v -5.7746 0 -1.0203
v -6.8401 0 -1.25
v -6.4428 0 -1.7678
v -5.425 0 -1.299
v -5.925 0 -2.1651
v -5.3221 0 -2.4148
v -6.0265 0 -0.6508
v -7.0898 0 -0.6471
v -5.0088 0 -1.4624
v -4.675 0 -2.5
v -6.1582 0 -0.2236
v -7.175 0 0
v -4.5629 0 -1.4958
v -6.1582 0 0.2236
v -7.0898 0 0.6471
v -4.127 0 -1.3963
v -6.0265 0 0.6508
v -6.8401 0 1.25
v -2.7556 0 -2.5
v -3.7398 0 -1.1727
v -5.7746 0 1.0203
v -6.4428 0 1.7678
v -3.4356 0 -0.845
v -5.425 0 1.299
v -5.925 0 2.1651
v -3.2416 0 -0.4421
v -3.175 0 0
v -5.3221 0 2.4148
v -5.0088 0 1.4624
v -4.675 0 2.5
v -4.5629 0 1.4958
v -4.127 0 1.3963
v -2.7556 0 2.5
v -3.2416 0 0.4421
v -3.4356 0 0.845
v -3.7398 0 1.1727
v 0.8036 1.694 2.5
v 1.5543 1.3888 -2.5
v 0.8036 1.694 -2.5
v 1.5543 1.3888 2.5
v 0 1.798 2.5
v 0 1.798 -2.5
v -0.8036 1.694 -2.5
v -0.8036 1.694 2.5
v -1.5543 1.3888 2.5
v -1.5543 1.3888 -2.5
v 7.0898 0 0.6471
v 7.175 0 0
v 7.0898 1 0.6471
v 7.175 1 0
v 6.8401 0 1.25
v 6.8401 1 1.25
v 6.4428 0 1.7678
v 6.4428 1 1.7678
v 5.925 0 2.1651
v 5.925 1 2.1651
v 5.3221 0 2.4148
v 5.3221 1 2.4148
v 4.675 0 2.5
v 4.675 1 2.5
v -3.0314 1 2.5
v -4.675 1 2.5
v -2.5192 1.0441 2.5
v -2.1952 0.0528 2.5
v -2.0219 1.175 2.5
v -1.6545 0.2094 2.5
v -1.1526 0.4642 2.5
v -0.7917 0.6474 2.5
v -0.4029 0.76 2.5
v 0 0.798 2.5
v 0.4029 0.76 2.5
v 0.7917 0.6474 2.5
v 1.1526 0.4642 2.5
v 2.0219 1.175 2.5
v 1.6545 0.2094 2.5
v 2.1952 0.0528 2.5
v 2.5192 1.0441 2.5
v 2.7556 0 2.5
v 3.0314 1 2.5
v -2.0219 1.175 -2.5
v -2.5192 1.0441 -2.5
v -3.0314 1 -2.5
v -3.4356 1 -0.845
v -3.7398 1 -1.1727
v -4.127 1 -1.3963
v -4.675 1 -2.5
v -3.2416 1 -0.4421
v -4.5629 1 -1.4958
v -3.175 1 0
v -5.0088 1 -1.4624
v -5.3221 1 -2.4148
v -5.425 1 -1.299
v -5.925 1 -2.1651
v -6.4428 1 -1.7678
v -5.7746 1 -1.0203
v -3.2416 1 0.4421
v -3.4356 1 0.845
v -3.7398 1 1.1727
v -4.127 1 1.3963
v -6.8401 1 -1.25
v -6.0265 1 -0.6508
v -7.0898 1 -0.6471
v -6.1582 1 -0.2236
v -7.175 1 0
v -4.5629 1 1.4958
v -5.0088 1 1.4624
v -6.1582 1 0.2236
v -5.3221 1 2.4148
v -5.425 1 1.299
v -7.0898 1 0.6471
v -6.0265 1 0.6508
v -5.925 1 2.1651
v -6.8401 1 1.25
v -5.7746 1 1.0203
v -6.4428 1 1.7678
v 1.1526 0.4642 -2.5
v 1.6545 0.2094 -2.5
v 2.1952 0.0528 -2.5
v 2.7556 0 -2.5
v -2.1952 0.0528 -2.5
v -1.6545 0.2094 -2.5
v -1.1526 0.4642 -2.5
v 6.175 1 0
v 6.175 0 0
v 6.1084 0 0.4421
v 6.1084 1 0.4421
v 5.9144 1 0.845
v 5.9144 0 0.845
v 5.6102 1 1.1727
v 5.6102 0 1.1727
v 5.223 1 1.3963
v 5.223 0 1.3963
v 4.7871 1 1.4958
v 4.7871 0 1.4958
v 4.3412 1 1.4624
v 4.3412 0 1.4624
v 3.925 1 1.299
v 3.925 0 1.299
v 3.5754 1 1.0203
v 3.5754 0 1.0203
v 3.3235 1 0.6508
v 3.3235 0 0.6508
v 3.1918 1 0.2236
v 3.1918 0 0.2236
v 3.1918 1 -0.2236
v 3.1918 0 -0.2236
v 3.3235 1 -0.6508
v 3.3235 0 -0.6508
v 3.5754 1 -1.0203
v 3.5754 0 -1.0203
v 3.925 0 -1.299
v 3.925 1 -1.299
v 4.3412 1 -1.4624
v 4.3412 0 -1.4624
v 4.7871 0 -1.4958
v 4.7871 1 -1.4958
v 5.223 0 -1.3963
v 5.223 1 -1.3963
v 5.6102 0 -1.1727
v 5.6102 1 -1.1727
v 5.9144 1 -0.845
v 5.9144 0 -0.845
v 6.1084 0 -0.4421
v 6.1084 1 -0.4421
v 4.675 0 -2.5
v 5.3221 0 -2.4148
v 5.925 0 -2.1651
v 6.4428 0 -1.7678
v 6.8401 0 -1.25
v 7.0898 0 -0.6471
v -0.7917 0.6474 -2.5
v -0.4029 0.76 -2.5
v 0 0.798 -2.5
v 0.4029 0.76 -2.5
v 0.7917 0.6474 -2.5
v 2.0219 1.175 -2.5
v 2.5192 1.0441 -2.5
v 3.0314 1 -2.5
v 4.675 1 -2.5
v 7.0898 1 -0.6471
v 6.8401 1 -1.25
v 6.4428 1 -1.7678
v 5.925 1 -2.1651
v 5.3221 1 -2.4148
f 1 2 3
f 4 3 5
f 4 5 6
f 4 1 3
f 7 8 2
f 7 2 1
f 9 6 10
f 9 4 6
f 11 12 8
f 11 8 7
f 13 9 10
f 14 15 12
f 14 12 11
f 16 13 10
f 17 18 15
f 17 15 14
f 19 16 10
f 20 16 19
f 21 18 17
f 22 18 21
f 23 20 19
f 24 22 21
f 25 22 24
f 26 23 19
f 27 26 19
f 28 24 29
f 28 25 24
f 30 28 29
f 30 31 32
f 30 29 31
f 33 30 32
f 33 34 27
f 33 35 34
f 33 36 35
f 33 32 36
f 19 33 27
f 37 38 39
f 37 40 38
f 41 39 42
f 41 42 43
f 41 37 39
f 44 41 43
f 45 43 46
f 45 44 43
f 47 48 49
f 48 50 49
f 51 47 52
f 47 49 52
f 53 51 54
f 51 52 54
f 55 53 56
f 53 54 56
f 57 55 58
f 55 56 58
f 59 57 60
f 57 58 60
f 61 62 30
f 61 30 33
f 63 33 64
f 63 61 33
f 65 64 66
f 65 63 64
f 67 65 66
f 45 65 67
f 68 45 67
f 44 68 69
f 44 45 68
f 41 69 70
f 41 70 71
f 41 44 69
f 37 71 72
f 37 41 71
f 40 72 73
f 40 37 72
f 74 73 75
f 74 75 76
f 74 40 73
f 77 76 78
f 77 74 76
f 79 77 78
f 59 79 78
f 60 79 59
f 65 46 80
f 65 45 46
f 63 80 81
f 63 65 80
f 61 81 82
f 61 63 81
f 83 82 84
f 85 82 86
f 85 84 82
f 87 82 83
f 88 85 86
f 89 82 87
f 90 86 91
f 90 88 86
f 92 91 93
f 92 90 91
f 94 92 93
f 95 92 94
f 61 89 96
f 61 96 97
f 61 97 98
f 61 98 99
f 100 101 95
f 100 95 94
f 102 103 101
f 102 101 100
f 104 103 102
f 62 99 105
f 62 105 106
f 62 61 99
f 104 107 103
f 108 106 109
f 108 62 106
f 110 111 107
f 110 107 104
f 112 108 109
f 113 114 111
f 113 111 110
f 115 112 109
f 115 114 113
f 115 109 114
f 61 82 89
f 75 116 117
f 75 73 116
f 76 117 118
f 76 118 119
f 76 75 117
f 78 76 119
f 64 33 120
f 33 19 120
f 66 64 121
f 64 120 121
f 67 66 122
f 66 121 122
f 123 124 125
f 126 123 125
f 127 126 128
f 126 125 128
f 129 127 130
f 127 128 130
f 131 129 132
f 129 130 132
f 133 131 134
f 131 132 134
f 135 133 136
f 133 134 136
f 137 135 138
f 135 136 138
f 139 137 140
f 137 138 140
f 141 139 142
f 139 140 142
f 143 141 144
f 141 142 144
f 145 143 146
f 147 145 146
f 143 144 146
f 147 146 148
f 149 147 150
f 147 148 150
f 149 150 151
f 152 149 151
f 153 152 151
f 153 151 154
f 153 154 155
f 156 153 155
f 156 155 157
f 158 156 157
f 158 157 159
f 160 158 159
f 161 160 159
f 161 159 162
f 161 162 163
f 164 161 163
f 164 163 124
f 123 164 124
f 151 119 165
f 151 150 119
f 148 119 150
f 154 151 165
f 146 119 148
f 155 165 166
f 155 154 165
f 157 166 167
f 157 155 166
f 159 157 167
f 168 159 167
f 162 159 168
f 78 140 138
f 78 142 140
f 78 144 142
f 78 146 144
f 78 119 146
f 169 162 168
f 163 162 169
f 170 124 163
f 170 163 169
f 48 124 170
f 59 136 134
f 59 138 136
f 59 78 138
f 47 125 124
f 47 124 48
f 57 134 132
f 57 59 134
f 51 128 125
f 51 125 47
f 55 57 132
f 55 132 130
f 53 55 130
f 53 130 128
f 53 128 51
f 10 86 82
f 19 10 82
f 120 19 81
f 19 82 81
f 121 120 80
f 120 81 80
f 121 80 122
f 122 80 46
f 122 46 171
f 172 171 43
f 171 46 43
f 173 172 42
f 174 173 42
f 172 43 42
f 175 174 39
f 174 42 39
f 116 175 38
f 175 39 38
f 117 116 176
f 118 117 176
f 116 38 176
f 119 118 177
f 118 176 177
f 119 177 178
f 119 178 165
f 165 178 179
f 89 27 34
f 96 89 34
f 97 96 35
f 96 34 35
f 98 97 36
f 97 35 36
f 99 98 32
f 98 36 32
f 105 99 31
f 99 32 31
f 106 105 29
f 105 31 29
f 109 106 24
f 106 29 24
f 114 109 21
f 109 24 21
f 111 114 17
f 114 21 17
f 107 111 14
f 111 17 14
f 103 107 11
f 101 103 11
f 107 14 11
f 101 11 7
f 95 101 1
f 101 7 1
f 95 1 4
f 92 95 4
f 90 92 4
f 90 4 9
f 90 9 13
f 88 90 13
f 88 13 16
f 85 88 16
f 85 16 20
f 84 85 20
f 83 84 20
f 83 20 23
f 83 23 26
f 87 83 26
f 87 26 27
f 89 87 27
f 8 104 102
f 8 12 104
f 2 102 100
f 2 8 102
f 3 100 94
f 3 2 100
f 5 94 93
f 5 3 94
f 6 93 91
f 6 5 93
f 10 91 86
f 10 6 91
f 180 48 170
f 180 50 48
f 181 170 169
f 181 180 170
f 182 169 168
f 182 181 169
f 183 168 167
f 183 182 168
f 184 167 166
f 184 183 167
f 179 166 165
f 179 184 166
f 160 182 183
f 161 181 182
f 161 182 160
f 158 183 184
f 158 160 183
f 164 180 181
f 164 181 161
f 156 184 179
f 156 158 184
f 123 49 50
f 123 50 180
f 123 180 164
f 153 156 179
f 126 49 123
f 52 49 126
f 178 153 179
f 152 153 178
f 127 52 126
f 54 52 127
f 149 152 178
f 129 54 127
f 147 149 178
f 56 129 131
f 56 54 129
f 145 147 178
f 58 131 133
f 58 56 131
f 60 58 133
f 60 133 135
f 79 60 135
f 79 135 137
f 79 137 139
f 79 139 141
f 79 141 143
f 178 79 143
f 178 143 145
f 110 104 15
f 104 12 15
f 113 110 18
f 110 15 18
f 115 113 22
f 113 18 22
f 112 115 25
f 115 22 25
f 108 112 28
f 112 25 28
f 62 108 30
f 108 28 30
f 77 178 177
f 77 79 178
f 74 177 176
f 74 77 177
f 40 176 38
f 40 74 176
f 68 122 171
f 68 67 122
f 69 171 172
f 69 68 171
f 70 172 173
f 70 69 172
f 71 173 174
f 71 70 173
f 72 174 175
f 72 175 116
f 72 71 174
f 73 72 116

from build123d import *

# Parameters (mm, degrees)
F1_DEPTH      = 2.5
F1_DEPTH_BACK = 2.5
F2_R          = 2.49999
F3_R          = 1.5
F4_DEPTH      = 25
F5_R          = 3


# Not quite as in the source:
# - a fillet or chamfer is up to 0.001 mm smaller than in the source, because OpenCascade refuses the exact size


with BuildPart() as f1:
    # F0 (on Top) → F1 (new body, two sides)
    with BuildSketch(Plane.XY) as f1_sk:
        with BuildLine():
            Line((-6.175, 0), (-4.675, 0))
            Line((-4.675, 0), (-3.175, 0))
            Line((-3.175, 0), (-1.675, 0))
            ThreePointArc((-1.675, 0), (-0.9276877762, 0.5883021777), (0, 0.7979933839))
            Line((0, 0.7979933839), (0, 1))
            Line((0, 1), (-2.0980018512, 1))
            Line((-2.0980018512, 1), (-7.175, 1))
            Line((-7.175, 1), (-7.175, 0))
            Line((-7.175, 0), (-6.175, 0))
        make_face()
        with BuildLine():
            Line((-2.0980018512, 1), (0, 1))
            Line((0, 1), (2.0980018512, 1))
            ThreePointArc((2.0980018512, 1), (0, 1.7979933839), (-2.0980018512, 1))
        make_face()
        with BuildLine():
            Line((0, 1), (0, 0.7979933839))
            ThreePointArc((0, 0.7979933839), (0.9276877762, 0.5883021777), (1.675, 0))
            Line((1.675, 0), (3.175, 0))
            Line((3.175, 0), (4.675, 0))
            Line((4.675, 0), (6.175, 0))
            Line((6.175, 0), (7.175, 0))
            Line((7.175, 0), (7.175, 1))
            Line((7.175, 1), (2.0980018512, 1))
            Line((2.0980018512, 1), (0, 1))
        make_face()
    extrude(amount=F1_DEPTH)
    extrude(f1_sk.sketch, amount=-F1_DEPTH_BACK)

    # F2 (radius 2.5 in the source; OpenCascade refuses exactly that, so slightly less here)
    f2_edges = [f1.edges().sort_by_distance(p)[0] for p in [
        (7.175, 0.5, 2.5),
        (7.175, 0.5, -2.5),
        (-7.175, 0.5, 2.5),
        (-7.175, 0.5, -2.5),
    ]]
    fillet(f2_edges, radius=F2_R)

    # F3 (on face) → F4 (cut)
    with BuildSketch(Plane.XZ):
        with BuildLine():
            ThreePointArc((3.175, 0), (4.675, -1.5), (6.175, 0))
            ThreePointArc((6.175, 0), (4.675, 1.5), (3.175, 0))
        make_face()
        with Locations((-4.675, 0)):
            Circle(F3_R)
    extrude(amount=-F4_DEPTH, mode=Mode.SUBTRACT)

    # F5
    f5_edges = [f1.edges().sort_by_distance(p)[0] for p in [
        (1.675, 0, 0),
        (-1.675, 0, 0),
        (-2.098002, 1, 0),
        (2.098002, 1, 0),
    ]]
    fillet(f5_edges, radius=F5_R)


solid = f1.part
